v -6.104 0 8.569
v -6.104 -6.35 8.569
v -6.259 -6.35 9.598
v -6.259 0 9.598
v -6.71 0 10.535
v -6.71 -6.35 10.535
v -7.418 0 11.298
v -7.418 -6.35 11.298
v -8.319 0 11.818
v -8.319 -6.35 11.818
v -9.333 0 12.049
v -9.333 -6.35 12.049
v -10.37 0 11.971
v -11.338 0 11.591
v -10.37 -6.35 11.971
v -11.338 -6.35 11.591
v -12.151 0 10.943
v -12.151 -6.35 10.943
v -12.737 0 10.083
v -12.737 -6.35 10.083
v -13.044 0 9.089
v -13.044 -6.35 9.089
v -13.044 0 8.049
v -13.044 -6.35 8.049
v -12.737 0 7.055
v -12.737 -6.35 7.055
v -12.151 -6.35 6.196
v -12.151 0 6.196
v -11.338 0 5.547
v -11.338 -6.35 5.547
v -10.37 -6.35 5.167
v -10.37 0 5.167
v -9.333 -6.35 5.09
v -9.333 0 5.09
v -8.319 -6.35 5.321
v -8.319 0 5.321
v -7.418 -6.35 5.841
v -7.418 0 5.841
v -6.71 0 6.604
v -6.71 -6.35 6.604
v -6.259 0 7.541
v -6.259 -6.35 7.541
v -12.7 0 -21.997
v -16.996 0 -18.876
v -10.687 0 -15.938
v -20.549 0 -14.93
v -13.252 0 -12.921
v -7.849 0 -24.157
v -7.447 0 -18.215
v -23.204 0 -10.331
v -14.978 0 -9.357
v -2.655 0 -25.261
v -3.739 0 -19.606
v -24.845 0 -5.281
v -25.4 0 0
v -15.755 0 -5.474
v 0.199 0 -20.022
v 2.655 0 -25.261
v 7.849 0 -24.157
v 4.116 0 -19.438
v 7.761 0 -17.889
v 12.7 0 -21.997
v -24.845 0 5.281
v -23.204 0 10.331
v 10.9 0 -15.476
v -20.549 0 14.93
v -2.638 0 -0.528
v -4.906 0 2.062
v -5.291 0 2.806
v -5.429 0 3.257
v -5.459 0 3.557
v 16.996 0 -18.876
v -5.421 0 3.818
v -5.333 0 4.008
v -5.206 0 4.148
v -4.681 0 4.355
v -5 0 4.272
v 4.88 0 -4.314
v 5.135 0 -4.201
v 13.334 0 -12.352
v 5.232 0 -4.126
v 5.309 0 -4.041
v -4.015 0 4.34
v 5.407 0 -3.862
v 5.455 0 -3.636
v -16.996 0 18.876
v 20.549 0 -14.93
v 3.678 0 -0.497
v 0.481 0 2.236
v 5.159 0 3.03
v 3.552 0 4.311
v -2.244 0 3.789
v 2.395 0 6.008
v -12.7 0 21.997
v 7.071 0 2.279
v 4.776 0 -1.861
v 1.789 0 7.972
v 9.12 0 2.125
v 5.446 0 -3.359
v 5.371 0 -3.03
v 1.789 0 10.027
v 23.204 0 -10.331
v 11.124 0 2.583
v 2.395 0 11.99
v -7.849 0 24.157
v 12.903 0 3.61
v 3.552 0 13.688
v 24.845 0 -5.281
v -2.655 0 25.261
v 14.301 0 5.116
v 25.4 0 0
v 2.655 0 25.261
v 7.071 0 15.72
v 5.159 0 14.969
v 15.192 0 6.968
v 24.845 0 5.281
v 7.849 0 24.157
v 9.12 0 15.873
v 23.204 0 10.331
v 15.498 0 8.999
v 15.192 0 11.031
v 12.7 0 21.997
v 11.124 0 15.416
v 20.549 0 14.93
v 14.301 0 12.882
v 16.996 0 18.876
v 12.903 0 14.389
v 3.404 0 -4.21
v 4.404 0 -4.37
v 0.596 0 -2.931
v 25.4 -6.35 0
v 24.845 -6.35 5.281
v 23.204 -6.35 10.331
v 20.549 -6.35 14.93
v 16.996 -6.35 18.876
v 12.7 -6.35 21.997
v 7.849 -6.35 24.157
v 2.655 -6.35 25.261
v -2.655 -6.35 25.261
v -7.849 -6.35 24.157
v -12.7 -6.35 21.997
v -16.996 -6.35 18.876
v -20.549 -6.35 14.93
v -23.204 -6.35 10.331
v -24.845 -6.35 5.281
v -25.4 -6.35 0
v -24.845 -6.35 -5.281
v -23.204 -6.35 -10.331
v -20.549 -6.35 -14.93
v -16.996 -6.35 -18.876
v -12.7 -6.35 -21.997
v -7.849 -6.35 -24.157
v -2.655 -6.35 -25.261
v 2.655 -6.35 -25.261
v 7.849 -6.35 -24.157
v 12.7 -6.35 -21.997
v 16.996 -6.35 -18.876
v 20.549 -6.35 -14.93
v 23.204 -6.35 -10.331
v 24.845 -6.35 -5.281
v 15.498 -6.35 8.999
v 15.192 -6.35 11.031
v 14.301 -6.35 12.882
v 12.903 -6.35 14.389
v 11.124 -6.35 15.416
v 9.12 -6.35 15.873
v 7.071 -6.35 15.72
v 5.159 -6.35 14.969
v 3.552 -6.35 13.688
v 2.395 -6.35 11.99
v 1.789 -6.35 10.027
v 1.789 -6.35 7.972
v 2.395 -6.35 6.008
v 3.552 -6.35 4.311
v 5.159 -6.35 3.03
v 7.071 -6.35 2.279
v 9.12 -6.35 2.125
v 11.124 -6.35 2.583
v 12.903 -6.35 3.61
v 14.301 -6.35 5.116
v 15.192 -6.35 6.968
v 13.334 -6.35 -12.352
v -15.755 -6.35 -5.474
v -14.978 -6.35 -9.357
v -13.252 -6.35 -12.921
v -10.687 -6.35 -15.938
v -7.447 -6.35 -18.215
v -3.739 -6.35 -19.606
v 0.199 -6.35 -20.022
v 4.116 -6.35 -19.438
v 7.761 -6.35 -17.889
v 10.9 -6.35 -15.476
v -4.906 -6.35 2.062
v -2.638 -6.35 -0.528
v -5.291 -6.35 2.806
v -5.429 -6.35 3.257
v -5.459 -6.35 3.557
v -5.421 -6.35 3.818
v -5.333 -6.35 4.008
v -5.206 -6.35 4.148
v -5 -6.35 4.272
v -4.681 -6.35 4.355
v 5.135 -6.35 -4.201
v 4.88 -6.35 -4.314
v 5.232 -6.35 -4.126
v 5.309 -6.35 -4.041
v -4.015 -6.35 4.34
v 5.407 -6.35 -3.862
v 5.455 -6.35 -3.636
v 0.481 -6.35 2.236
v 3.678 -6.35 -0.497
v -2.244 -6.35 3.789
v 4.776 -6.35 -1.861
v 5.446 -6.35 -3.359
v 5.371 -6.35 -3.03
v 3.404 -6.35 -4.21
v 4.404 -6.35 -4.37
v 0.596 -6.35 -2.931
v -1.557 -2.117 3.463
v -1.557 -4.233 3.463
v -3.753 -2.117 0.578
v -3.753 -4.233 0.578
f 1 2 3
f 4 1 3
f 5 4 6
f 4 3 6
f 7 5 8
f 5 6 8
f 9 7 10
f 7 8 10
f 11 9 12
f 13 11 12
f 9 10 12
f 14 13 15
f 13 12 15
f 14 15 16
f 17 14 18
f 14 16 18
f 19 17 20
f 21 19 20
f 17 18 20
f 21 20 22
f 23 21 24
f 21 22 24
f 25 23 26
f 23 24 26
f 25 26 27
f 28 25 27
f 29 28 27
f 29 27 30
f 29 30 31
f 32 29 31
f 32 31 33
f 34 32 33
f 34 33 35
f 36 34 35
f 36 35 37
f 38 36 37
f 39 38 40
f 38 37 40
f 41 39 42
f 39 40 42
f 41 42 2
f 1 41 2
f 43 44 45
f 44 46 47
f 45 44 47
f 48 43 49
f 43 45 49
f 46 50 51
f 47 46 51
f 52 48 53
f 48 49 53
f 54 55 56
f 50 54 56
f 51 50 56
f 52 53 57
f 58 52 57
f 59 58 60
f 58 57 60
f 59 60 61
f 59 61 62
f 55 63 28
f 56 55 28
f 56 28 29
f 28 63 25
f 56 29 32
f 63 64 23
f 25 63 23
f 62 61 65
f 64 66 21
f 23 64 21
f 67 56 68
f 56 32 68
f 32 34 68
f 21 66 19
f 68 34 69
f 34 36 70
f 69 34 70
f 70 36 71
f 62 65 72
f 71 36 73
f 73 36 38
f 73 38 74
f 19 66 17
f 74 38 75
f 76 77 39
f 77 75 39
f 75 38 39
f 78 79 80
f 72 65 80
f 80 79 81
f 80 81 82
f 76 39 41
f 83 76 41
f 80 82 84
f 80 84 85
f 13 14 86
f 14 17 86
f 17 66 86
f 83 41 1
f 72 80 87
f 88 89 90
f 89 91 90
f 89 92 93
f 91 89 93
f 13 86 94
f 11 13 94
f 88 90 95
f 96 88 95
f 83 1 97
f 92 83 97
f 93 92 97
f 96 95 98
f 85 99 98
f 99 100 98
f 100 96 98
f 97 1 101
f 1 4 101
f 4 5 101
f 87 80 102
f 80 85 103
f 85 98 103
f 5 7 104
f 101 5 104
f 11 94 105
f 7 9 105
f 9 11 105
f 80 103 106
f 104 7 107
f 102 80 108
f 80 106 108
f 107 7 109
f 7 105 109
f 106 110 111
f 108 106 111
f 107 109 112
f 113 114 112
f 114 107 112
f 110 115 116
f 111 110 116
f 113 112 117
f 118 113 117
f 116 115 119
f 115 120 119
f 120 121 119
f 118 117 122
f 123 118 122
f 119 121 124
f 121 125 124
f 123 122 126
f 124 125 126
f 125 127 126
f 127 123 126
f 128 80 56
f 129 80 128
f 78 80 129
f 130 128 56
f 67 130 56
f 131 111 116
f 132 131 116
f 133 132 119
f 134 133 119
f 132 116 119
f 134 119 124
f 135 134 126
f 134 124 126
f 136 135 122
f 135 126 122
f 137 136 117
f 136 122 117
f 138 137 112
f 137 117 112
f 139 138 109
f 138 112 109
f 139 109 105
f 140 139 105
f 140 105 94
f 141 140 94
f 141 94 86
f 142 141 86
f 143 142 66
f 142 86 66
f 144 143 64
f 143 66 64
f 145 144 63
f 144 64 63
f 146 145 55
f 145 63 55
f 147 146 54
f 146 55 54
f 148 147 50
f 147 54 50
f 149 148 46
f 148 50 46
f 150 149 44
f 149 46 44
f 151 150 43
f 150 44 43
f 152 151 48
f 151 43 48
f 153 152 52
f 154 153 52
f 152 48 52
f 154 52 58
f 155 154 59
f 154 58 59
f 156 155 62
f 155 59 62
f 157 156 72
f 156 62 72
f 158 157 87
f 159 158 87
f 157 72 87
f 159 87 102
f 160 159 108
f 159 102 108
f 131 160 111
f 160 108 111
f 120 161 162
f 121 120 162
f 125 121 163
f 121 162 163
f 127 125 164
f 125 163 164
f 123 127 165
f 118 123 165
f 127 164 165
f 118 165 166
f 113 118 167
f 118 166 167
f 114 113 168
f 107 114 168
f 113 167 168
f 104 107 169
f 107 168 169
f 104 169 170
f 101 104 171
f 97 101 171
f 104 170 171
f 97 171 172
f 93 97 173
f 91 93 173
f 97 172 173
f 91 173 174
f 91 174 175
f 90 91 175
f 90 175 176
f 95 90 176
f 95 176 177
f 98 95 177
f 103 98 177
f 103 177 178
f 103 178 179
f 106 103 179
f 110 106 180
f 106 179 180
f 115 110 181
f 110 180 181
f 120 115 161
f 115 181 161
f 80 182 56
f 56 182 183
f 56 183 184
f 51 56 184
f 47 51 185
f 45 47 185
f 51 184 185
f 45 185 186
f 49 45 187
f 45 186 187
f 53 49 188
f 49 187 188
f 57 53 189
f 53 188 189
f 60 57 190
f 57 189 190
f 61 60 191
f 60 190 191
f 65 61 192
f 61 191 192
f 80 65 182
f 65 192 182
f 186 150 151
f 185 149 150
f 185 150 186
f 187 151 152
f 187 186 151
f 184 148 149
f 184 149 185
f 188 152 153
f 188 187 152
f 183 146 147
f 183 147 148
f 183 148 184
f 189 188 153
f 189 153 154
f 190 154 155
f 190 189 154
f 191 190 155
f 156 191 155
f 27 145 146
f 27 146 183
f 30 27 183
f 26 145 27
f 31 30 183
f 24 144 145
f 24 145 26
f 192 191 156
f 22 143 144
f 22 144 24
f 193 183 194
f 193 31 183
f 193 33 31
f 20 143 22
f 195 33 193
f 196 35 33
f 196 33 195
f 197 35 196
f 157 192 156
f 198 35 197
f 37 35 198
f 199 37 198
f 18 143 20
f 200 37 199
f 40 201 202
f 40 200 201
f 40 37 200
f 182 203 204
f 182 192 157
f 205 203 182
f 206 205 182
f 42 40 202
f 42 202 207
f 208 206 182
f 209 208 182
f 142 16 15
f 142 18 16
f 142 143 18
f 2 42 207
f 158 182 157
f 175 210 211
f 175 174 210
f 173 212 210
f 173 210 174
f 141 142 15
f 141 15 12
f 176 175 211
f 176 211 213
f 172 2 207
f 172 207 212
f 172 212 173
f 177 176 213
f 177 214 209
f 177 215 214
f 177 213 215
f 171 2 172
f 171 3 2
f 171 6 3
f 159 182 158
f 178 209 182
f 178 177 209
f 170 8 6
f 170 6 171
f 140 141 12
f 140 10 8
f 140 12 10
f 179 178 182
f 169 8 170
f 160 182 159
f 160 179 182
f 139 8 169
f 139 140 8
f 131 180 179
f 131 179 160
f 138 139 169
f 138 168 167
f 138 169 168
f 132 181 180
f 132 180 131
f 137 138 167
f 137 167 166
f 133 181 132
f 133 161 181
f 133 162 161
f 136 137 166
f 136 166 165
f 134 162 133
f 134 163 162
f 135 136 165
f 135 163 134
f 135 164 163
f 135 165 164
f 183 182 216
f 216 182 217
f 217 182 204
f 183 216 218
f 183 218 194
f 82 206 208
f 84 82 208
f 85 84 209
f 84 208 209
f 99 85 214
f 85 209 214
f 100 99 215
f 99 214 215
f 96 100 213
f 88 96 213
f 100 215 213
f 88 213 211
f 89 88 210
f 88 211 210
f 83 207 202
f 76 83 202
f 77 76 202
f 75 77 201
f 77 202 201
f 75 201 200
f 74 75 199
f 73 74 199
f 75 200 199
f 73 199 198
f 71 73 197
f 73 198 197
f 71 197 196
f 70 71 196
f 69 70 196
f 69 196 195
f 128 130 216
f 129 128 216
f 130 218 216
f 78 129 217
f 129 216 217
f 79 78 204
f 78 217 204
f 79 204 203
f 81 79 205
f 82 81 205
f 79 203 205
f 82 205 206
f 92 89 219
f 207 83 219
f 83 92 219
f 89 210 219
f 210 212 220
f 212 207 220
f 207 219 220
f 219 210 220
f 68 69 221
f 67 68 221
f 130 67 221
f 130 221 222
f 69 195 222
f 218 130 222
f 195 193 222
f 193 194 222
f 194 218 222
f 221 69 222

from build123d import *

# Parameters (mm, degrees)
F0_R     = 25.4
F1_DEPTH = 6.35
F2_R     = 3.489483
F2_R_2   = 6.893113
F3_DEPTH = 6.35


with BuildPart() as f1:
    # F0 (on Front) → F1 (new body)
    with BuildSketch(Plane.XZ):
        Circle(F0_R)
    extrude(amount=F1_DEPTH)

    # F2 (on face) → F3 (cut)
    with BuildSketch(Plane.XZ.offset(6.35)):
        with Locations((-9.59337, 8.569406)):
            Circle(F2_R)
        with Locations((8.605205, 8.999294)):
            Circle(F2_R_2)
        with BuildLine():
            add(Edge.make_bspline(
                [(5.309401, -4.040631), (7.505178, -1.155375), (-1.556812, 3.462944), (-10.618802, 8.081263), (-3.752589, 0.577687), (3.113625, -6.925888), (5.309401, -4.040631)],
                knots=[0, 0, 0, 2.094395, 2.094395, 4.18879, 4.18879, 6.283185, 6.283185, 6.283185], degree=2, weights=[1, 0.5, 1, 0.5, 1, 0.5, 1]))
        make_face()
        with BuildLine():
            Line((13.33397, -12.351792), (-15.755093, -5.47359))
            ThreePointArc((-15.755093, -5.47359), (-3.738986, -19.605821), (13.33397, -12.351792))
        make_face()
    extrude(amount=-F3_DEPTH, mode=Mode.SUBTRACT)


solid = f1.part
